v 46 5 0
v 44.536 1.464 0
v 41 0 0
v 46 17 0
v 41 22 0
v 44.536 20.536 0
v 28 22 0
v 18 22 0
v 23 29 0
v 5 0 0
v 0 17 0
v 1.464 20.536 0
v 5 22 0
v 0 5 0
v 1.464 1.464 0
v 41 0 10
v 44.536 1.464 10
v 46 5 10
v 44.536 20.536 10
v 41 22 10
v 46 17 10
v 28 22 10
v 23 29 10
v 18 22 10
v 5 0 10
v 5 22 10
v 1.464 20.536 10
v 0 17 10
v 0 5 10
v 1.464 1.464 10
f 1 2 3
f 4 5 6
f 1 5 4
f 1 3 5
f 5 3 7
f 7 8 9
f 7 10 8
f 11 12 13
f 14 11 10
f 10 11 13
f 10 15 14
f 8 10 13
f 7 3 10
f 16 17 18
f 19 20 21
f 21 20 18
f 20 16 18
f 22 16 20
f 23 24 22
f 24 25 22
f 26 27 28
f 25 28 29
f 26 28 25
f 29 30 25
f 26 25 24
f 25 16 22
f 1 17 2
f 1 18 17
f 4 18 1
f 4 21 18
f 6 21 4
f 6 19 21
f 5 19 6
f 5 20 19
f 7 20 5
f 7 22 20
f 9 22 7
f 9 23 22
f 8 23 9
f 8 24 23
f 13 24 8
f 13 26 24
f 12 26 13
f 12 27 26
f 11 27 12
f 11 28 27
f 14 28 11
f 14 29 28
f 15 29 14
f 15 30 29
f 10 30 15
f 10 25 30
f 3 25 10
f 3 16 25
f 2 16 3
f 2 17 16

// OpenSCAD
$fn = 32;

// ----------------------------------------------------------------------
// Ratchet pawl: 46 x 22 mm body, beak 7 mm сверху
// ----------------------------------------------------------------------

// --- parameters (mm) ---
profile_height = 10;      // extrusion height
profile_points = 15;      // points of the closed outline

profile = [[0, 5], [1.464, 1.464], [5, 0], [41, 0], [44.536, 1.464], [46, 5], [46, 17], [44.536, 20.536], [41, 22], [28, 22], [23, 29], [18, 22], [5, 22], [1.464, 20.536], [0, 17]];  // single closed polygon, 15 points, counter clockwise

// --- the one profile operation ---
linear_extrude(height = profile_height) polygon(points = profile);
